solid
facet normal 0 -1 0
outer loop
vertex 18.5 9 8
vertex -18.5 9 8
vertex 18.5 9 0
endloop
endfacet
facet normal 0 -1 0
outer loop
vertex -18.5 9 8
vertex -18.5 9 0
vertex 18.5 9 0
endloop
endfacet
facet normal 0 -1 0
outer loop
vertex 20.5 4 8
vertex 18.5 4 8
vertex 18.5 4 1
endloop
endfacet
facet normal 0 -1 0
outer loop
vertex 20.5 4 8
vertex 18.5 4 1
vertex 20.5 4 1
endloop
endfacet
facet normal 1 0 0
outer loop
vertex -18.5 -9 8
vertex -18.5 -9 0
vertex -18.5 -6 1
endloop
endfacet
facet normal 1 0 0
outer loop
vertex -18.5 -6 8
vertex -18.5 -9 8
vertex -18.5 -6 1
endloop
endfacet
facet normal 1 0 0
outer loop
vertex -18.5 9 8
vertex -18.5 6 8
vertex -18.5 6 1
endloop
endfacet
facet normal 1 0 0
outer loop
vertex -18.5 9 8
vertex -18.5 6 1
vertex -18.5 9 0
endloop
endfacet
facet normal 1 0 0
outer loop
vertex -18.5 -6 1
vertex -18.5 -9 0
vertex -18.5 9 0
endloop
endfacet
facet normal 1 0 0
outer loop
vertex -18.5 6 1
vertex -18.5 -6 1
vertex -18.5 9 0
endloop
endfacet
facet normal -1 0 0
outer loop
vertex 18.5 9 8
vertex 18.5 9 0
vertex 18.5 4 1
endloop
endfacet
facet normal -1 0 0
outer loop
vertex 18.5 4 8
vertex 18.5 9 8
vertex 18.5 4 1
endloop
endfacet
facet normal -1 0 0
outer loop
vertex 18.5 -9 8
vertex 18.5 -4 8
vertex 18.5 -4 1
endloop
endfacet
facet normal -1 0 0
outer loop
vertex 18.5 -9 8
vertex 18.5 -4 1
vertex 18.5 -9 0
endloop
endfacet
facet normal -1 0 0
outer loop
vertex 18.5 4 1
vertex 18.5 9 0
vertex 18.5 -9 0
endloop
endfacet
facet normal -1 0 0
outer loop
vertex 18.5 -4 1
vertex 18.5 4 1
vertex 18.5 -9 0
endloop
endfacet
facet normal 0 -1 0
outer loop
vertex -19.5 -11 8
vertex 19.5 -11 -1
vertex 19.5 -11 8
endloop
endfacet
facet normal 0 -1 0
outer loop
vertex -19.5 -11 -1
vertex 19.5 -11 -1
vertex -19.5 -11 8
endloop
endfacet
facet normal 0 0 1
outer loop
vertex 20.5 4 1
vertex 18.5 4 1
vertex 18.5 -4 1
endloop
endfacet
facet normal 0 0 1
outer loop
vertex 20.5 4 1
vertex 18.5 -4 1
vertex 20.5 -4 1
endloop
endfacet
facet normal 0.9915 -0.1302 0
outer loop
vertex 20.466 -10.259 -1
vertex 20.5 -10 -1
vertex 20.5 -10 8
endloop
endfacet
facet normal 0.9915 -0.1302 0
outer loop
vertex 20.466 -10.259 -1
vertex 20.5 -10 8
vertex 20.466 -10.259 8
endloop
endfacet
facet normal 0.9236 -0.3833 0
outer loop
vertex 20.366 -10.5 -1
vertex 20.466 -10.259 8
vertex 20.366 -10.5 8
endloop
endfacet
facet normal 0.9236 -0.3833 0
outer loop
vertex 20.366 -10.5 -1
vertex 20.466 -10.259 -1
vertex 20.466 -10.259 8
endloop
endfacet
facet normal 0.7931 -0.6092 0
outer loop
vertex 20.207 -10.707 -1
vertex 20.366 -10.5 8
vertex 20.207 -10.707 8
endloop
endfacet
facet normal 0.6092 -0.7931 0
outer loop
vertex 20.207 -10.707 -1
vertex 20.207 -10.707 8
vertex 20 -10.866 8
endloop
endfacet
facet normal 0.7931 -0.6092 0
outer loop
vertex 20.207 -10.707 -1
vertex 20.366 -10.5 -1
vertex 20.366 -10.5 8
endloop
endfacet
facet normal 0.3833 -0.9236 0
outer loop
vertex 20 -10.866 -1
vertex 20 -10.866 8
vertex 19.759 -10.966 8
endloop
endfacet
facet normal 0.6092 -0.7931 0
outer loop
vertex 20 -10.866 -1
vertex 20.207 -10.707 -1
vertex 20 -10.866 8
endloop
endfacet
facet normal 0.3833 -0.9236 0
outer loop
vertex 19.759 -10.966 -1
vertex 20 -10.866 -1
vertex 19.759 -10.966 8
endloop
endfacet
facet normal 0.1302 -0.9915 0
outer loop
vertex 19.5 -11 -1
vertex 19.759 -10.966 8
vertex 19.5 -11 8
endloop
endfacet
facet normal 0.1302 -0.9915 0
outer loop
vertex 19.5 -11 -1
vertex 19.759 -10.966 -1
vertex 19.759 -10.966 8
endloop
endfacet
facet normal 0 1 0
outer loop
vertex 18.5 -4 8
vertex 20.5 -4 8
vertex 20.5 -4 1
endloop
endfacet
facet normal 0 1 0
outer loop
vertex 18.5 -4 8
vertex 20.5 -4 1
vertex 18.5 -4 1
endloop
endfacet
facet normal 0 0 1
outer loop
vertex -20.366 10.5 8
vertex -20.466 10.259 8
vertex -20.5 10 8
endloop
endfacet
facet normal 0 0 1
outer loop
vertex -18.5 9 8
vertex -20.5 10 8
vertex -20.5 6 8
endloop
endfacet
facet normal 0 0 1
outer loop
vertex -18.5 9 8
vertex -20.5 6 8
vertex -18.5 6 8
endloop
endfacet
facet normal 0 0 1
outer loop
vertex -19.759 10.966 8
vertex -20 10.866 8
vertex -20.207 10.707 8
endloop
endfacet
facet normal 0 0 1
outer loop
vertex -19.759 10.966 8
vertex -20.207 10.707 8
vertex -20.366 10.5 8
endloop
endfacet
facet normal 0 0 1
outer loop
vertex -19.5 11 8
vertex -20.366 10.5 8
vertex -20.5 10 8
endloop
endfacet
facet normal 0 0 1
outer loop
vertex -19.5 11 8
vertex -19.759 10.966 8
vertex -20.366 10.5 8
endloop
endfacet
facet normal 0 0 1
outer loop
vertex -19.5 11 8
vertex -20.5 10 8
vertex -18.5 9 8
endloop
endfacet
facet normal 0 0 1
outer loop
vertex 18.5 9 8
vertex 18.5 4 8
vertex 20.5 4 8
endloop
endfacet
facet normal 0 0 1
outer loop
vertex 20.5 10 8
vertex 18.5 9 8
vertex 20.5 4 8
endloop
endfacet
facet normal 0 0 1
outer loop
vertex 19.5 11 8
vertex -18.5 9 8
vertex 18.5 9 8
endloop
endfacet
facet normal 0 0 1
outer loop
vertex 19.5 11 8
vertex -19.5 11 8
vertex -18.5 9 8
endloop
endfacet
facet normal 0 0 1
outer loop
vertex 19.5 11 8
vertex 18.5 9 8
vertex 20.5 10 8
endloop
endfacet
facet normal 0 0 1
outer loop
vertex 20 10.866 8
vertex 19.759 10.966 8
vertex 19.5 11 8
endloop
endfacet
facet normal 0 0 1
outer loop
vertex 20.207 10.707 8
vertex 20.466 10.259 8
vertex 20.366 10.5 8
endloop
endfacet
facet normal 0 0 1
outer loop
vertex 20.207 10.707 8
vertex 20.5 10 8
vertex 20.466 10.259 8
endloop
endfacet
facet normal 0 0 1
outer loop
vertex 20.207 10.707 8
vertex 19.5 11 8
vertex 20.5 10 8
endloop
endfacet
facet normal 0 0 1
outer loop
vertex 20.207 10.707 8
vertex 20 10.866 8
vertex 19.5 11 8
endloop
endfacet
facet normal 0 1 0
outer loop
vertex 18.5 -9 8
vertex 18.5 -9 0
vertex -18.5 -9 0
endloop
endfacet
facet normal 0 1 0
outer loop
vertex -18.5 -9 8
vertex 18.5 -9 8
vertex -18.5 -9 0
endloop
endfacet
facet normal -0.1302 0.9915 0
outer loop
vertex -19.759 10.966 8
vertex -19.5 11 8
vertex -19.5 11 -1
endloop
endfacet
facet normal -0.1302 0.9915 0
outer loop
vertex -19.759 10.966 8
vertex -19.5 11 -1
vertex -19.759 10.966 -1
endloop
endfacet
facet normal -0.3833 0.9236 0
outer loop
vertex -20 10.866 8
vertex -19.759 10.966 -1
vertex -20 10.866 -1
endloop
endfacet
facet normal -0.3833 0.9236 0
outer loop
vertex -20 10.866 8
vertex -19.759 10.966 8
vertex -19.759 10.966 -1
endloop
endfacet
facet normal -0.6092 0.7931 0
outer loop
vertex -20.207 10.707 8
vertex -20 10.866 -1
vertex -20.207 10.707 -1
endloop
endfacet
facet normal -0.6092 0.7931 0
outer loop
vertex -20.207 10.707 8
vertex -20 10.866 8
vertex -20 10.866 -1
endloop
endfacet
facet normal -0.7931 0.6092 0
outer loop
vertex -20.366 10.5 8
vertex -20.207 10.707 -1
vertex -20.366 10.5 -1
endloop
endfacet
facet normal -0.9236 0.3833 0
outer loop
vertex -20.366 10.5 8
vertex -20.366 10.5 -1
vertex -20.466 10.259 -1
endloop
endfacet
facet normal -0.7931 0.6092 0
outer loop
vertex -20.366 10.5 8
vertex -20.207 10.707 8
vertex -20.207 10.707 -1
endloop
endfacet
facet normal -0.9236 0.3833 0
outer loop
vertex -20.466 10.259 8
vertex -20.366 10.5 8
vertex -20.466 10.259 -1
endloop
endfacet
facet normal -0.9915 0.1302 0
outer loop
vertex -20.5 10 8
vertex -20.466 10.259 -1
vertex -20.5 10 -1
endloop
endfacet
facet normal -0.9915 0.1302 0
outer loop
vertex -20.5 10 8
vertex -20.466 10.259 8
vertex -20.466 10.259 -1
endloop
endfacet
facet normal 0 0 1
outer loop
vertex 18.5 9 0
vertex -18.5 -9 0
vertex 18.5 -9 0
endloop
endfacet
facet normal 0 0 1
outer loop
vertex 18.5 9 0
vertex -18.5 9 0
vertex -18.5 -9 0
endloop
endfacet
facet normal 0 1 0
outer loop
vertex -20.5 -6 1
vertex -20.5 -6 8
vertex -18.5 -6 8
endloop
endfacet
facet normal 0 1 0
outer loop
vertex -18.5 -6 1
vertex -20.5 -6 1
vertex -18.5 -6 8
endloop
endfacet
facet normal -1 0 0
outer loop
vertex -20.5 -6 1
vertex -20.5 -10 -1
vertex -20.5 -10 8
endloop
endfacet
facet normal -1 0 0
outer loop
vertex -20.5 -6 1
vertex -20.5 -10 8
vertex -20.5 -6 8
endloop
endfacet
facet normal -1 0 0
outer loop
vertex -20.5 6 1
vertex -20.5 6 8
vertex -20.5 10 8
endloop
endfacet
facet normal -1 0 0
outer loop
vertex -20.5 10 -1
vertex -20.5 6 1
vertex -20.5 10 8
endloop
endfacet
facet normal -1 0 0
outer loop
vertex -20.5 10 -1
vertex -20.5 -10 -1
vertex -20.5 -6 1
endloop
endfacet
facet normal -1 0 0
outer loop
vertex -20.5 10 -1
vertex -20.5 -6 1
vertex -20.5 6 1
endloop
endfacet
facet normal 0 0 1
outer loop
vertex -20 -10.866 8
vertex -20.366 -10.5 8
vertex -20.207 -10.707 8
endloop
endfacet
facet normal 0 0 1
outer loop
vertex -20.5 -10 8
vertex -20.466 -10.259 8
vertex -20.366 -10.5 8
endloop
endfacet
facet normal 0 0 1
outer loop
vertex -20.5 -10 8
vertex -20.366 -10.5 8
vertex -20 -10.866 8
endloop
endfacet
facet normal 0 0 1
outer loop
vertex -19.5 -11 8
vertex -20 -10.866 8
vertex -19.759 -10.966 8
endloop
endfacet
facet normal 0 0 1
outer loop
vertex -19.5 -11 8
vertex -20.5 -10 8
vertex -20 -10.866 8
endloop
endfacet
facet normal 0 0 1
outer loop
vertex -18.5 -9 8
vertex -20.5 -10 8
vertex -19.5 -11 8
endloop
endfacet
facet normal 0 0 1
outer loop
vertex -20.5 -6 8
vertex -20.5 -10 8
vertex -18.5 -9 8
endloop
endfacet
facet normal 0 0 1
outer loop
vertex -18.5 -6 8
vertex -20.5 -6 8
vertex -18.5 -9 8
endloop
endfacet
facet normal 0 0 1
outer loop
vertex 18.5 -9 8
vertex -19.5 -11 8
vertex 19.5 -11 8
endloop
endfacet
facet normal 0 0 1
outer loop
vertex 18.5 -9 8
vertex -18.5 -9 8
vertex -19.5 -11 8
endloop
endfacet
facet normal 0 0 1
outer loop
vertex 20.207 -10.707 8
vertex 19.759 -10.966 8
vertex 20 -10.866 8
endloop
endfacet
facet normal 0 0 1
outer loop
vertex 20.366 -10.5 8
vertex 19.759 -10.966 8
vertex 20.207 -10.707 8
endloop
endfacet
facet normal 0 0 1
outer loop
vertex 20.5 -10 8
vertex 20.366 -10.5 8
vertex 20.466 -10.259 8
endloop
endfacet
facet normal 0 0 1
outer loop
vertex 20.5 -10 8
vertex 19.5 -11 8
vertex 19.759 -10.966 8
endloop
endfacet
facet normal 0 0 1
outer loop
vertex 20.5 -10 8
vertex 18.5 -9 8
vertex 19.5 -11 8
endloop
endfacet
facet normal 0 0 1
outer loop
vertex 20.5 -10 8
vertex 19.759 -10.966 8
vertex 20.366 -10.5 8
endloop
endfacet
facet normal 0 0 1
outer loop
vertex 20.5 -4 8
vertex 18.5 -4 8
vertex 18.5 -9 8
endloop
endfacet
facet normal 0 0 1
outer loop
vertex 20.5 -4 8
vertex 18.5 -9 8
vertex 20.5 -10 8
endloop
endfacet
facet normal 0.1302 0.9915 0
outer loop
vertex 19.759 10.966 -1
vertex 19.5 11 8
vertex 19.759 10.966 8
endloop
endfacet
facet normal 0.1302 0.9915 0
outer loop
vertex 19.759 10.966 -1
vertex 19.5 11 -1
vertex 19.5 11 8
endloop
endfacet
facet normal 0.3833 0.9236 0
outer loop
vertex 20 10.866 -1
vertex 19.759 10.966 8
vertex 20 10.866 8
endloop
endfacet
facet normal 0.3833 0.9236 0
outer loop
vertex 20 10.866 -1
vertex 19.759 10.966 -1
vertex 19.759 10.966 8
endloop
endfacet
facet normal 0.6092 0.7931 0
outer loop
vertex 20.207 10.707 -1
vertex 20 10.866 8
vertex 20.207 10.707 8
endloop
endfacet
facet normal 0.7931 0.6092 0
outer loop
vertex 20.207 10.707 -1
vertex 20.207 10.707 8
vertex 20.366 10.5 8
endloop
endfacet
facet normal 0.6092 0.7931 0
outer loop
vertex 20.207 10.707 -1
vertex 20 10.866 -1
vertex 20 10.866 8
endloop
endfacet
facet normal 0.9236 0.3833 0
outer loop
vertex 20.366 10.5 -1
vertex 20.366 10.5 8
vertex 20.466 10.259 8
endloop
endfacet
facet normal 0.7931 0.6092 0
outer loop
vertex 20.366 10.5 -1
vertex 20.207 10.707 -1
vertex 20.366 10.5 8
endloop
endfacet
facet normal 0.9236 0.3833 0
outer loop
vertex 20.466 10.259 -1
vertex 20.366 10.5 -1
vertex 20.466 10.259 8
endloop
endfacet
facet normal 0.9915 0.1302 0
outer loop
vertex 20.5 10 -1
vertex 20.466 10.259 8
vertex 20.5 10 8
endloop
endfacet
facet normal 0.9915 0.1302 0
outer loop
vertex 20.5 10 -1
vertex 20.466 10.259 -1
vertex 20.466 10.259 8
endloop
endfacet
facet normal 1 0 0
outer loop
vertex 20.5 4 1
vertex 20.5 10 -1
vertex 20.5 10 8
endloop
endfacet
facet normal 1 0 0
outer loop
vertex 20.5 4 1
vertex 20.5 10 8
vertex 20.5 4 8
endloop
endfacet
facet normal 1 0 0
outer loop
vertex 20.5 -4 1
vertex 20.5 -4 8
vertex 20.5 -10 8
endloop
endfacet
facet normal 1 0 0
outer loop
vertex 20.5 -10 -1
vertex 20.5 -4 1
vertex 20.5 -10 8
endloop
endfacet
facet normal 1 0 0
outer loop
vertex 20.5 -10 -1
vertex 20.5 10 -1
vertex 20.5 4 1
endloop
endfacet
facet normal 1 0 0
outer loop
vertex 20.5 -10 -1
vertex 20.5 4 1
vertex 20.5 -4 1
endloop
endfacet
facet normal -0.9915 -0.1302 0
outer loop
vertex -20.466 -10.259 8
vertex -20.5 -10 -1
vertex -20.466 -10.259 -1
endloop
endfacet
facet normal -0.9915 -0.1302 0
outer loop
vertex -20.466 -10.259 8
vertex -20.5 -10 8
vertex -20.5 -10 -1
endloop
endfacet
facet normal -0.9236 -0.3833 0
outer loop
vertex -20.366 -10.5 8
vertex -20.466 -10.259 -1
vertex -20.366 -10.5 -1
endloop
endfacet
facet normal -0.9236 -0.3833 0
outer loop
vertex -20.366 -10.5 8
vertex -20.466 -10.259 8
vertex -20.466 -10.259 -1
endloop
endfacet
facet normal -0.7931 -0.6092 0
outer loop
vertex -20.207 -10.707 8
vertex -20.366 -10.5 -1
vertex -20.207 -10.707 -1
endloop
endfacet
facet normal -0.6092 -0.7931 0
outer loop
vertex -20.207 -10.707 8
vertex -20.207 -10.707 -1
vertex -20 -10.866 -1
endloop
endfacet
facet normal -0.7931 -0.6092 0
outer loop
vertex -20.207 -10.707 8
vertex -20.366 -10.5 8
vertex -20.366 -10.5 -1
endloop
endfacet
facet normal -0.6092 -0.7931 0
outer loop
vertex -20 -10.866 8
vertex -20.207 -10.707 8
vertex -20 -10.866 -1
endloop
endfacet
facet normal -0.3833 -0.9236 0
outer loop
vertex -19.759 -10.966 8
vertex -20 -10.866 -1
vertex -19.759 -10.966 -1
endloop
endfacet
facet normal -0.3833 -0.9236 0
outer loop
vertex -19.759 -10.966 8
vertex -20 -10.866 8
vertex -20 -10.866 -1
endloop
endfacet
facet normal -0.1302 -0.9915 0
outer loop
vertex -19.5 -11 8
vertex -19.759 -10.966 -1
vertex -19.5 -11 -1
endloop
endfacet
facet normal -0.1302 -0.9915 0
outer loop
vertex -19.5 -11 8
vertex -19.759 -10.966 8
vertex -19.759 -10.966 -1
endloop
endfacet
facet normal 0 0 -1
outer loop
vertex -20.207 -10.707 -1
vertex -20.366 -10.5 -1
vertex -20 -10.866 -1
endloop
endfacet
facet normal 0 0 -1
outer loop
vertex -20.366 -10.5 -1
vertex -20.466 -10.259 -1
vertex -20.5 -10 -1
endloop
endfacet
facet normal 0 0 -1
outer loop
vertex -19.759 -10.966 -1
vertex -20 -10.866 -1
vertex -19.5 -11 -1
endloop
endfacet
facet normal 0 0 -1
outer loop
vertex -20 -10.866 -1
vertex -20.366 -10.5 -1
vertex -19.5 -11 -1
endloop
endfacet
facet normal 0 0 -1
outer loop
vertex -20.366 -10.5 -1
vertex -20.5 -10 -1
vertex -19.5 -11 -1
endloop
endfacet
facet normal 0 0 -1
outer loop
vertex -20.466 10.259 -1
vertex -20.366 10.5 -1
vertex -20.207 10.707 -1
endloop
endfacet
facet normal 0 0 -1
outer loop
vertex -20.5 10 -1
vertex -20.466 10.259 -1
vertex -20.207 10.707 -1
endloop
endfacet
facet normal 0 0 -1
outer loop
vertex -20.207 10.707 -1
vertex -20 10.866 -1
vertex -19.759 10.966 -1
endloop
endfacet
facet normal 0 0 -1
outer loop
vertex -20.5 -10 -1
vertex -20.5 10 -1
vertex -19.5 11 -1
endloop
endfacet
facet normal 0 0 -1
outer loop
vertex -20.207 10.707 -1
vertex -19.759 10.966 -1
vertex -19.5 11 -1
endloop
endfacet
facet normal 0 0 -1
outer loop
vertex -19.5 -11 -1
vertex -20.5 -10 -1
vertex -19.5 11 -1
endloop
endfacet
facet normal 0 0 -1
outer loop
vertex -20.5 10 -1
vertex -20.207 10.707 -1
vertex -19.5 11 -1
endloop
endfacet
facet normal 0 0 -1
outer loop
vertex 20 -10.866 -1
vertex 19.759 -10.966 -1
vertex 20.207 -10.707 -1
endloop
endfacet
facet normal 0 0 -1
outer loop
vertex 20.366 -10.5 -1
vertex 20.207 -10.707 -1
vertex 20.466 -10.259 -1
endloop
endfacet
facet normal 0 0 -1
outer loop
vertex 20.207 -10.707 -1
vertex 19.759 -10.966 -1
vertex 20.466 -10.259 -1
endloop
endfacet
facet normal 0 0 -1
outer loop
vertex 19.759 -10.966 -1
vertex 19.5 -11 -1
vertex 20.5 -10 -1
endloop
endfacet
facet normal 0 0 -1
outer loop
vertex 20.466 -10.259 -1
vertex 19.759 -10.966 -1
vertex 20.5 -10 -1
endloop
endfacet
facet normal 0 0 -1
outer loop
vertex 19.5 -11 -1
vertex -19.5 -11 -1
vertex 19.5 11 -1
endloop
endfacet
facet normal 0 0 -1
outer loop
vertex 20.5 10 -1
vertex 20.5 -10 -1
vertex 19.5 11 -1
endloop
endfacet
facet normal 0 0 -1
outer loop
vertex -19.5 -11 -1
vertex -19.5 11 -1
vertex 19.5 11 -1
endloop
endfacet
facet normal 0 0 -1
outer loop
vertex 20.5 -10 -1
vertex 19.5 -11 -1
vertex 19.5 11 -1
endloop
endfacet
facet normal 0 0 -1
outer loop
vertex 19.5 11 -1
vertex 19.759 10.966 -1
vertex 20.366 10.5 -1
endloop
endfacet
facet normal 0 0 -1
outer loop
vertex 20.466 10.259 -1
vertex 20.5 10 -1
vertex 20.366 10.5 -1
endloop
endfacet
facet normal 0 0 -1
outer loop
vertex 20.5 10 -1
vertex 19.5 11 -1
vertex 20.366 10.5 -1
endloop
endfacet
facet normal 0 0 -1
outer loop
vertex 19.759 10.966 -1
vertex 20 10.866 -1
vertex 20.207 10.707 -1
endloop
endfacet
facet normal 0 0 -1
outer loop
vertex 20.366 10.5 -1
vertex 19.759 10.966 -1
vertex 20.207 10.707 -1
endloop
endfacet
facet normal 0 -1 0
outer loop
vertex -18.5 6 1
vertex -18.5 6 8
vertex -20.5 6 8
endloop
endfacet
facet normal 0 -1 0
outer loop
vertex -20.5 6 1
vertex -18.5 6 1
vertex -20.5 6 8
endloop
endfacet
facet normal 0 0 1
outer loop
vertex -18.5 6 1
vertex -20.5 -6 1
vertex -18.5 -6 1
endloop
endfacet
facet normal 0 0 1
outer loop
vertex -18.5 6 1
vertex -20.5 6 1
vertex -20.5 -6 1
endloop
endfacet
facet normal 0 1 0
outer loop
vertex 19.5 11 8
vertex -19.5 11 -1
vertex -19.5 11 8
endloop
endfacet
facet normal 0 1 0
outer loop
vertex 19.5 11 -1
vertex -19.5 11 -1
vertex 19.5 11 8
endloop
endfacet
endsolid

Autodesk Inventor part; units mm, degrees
ref_plane "YZ Plane" through (0, 0, 0) normal (1, 0, 0) x (0, 1, 0)
ref_plane "XZ Plane" through (0, 0, 0) normal (0, 1, 0) x (-1, 0, 0)
ref_plane "XY Plane" through (0, 0, 0) normal (0, 0, 1) x (1, 0, 0)
sketch "Skizze1" plane through (0, 0, 0) normal (0, 0, 1) x (1, 0, 0)
  line L0 (-18.5, -9) -> (18.5, -9)
  line L1 (18.5, -9) -> (18.5, 9)
  line L2 (18.5, 9) -> (-18.5, 9)
  line L3 (-18.5, 9) -> (-18.5, -9)
  line L4 (-18.5, -9) -> (18.5, 9) construction
  line L5 (18.5, -9) -> (-18.5, 9) construction
  line L6 (-20.5, 11) -> (20.5, 11)
  line L7 (20.5, 11) -> (20.5, -11)
  line L8 (20.5, -11) -> (-20.5, -11)
  line L9 (-20.5, -11) -> (-20.5, 11)
  point P0 (0, 0)
  dimension "d0" = 18
  dimension "d1" = 37
  dimension "d2" = 2
extrude "Extrusion1" add sketch "Skizze1" against normal blind 1 contours L3 L2 L1 L0 | L6 L7 L8 L9
extrude "Extrusion2" add sketch "Skizze1" along normal blind 6
sketch "Skizze2" plane through (0, 0, 6) normal (0, 0, 1) x (1, 0, 0)
  line L0 (-18.5, -9) -> (-18.5, 9) projected
  line L1 (-18.5, 9) -> (18.5, 9) projected
  line L2 (18.5, 9) -> (18.5, -9) projected
  line L3 (18.5, -9) -> (-18.5, -9) projected
  line L4 (20.5, 11) -> (-20.5, 11) projected
  line L5 (-20.5, 11) -> (-20.5, -11) projected
  line L6 (-20.5, -11) -> (20.5, -11) projected
  line L7 (20.5, -11) -> (20.5, 11) projected
  line L8 (-20.5, -6) -> (0, -6)
  line L9 (0, -6) -> (0, 6)
  line L10 (0, 6) -> (-20.5, 6)
  line L11 (-20.5, 6) -> (-20.5, -6)
  line L12 (-20.5, 11) -> (-20.5, -11) projected
  point P0 (0, 0)
  point P1 (0, 0)
  dimension "d7" = 12
extrude "Extrusion3" cut sketch "Skizze2" against normal blind 5 contours L8 L5 L10 L0 | L0 L10 L9 L8
sketch "Skizze3" plane through (0, 0, 6) normal (0, 0, 1) x (1, 0, 0)
  line L0 (-20.5, 6) -> (-18.5, 6) projected
  line L1 (-18.5, 6) -> (-18.5, 9) projected
  line L2 (-18.5, 9) -> (18.5, 9) projected
  line L3 (18.5, 9) -> (18.5, -9) projected
  line L4 (18.5, -9) -> (-18.5, -9) projected
  line L5 (-18.5, -9) -> (-18.5, -6) projected
  line L6 (-18.5, -6) -> (-20.5, -6) projected
  line L7 (-20.5, -6) -> (-20.5, -11) projected
  line L8 (-20.5, -11) -> (20.5, -11) projected
  line L9 (20.5, -11) -> (20.5, 11) projected
  line L10 (20.5, 11) -> (-20.5, 11) projected
  line L11 (-20.5, 11) -> (-20.5, 6) projected
  line L12 (20.5, -4) -> (0, -4)
  line L13 (0, -4) -> (0, 4)
  line L14 (0, 4) -> (20.5, 4)
  line L15 (20.5, 4) -> (20.5, -4)
  point P0 (0, 0)
  point P1 (0, 0)
  point P2 (20.5, 0)
  dimension "d10" = 8
extrude "Extrusion4" cut sketch "Skizze3" against normal blind 5 contours L9 L12 L3 L14 | L3 L12 L13 L14
sketch "Skizze4" plane through (0, 0, 6) normal (0, 0, 1) x (1, 0, 0)
  line L0 (20.5, -4) -> (18.5, -4) projected
  line L1 (18.5, -4) -> (18.5, -9) projected
  line L2 (18.5, -9) -> (-18.5, -9) projected
  line L3 (-18.5, -9) -> (-18.5, -6) projected
  line L4 (-18.5, -6) -> (-20.5, -6) projected
  line L5 (-20.5, -6) -> (-20.5, -11) projected
  line L6 (-20.5, -11) -> (20.5, -11) projected
  line L7 (20.5, -11) -> (20.5, -4) projected
  line L8 (18.5, 4) -> (20.5, 4) projected
  line L9 (20.5, 4) -> (20.5, 11) projected
  line L10 (20.5, 11) -> (-20.5, 11) projected
  line L11 (-20.5, 11) -> (-20.5, 6) projected
  line L12 (-20.5, 6) -> (-18.5, 6) projected
  line L13 (-18.5, 6) -> (-18.5, 9) projected
  line L14 (-18.5, 9) -> (18.5, 9) projected
  line L15 (18.5, 9) -> (18.5, 4) projected
  point P0 (0, 0)
extrude "Extrusion5" add sketch "Skizze4" along normal blind 2
fillet "Rundung1" radius 1 4 edges at (20.5, 11, 3.5) (-20.5, 11, 3.5) (-20.5, -11, 3.5) (20.5, -11, 3.5)
properties part number "USB_case_A"
